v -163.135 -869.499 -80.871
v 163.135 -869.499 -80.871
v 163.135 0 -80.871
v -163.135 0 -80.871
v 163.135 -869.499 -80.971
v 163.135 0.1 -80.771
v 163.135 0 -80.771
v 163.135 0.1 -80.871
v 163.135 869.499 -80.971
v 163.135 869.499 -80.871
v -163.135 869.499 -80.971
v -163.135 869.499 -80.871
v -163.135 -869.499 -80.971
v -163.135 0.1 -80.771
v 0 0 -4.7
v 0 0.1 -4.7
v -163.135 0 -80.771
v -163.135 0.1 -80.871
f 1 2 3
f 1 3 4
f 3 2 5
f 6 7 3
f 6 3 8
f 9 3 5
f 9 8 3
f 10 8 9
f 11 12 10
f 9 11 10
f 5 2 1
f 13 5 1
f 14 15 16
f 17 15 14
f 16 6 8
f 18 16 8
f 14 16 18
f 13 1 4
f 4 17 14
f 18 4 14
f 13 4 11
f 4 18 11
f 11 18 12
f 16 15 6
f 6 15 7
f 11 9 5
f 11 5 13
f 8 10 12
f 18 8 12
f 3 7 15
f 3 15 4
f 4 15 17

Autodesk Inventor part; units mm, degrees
ref_plane "YZ Plane" through (0, 0, 0) normal (1, 0, 0) x (0, 1, 0)
ref_plane "XZ Plane" through (0, 0, 0) normal (0, 1, 0) x (-1, 0, 0)
ref_plane "XY Plane" through (0, 0, 0) normal (0, 0, 1) x (1, 0, 0)
sketch "Sketch1" plane through (0, 0, 0) normal (0, 1, 0) x (-1, 0, 0)
  line L0 (7, 0) -> (-7, 0) projected
  arc A0 (-5, -3.7812) -> (5, -3.7812) centre (0, 9.3638) ccw
  line L1 (0, -4.7) -> (163.1354, -80.7713)
  line L2 (0, -4.7) -> (180, -4.7) construction
  line L3 (0, -4.7) -> (97.3734, -4.7) construction
  line L4 (0, -4.7) -> (-163.1354, -80.7713)
  line L5 (0, -4.7) -> (180, -4.7) construction
  line L6 (-163.1354, -80.7713) -> (163.1354, -80.7713)
  point P0 (0, 0)
extrude "Extrusion1" add sketch "Sketch1" along normal blind 0.1
sketch "Sketch3" plane through (163.1354, 0, -80.7713) normal (0, 0, -1) x (-1, 0, 0)
  line L0 (0, 0) -> (326.2708, 0) projected
  line L1 (326.2708, 0) -> (326.2708, 0.1) projected
  line L2 (0, 0.1) -> (326.2708, 0.1) projected
  line L3 (0, 0) -> (0, 0.1) projected
  point P0 (163.1354, 0)
extrude "Extrusion2" add sketch "Sketch3" along normal blind 0.1
sketch "Sketch4" plane through (163.1354, 0, -80.7713) normal (1, 0, 0) x (0, 0, -1)
  line L0 (-76.0713, 0) -> (0, 0) projected
  line L1 (-76.0713, 0) -> (0, -869.4988)
  line L2 (-76.0713, 0) -> (796.7488, 0) construction
  line L3 (-76.0713, 0) -> (0, 869.4988)
  line L4 (-76.0713, 0) -> (796.7488, 0) construction
  line L5 (0, 869.4988) -> (0, -869.4988)
  point P0 (-80.7713, 0)
  dimension "d10" = 85
  dimension "d11" = 85
extrude "Extrusion3" add sketch "Sketch4" along normal blind 0.1
sketch "Sketch5" plane through (163.1354, 0, -80.8713) normal (0, 0, -1) x (-1, 0, 0)
  line L0 (0, -869.4988) -> (0, 0) projected
  line L1 (0, 0.1) -> (0, 0) projected
  line L2 (0, 0.1) -> (0, 869.4988) projected
  line L3 (0, 0) -> (326.2708, 0) projected
  line L4 (0, -869.4988) -> (326.2708, -869.4988)
  line L5 (326.2708, -869.4988) -> (326.2708, 869.4988)
  line L6 (326.2708, 869.4988) -> (0, 869.4988)
  line L7 (0, 869.4988) -> (0, -869.4988)
  point P0 (163.1354, 0)
extrude "Extrusion4" add sketch "Sketch5" along normal blind 0.1
sketch "Sketch6" plane through (163.2354, 0, -80.7713) normal (1, 0, 0) x (0, 0, -1)
  line L0 (0, -869.4988) -> (0, 0) projected
  line L1 (-76.0713, 0) -> (0, -869.4988) projected
  line L2 (0, 869.4988) -> (-76.0713, 0) projected
  line L3 (0, 0.1) -> (0, 869.4988) projected
  line L4 (0, 0) -> (0, 0.1) projected
  point P0 (-80.7713, 0)
extrude "Extrusion5" cut sketch "Sketch6" against normal blind 0.1
properties part number "FOVcam"
